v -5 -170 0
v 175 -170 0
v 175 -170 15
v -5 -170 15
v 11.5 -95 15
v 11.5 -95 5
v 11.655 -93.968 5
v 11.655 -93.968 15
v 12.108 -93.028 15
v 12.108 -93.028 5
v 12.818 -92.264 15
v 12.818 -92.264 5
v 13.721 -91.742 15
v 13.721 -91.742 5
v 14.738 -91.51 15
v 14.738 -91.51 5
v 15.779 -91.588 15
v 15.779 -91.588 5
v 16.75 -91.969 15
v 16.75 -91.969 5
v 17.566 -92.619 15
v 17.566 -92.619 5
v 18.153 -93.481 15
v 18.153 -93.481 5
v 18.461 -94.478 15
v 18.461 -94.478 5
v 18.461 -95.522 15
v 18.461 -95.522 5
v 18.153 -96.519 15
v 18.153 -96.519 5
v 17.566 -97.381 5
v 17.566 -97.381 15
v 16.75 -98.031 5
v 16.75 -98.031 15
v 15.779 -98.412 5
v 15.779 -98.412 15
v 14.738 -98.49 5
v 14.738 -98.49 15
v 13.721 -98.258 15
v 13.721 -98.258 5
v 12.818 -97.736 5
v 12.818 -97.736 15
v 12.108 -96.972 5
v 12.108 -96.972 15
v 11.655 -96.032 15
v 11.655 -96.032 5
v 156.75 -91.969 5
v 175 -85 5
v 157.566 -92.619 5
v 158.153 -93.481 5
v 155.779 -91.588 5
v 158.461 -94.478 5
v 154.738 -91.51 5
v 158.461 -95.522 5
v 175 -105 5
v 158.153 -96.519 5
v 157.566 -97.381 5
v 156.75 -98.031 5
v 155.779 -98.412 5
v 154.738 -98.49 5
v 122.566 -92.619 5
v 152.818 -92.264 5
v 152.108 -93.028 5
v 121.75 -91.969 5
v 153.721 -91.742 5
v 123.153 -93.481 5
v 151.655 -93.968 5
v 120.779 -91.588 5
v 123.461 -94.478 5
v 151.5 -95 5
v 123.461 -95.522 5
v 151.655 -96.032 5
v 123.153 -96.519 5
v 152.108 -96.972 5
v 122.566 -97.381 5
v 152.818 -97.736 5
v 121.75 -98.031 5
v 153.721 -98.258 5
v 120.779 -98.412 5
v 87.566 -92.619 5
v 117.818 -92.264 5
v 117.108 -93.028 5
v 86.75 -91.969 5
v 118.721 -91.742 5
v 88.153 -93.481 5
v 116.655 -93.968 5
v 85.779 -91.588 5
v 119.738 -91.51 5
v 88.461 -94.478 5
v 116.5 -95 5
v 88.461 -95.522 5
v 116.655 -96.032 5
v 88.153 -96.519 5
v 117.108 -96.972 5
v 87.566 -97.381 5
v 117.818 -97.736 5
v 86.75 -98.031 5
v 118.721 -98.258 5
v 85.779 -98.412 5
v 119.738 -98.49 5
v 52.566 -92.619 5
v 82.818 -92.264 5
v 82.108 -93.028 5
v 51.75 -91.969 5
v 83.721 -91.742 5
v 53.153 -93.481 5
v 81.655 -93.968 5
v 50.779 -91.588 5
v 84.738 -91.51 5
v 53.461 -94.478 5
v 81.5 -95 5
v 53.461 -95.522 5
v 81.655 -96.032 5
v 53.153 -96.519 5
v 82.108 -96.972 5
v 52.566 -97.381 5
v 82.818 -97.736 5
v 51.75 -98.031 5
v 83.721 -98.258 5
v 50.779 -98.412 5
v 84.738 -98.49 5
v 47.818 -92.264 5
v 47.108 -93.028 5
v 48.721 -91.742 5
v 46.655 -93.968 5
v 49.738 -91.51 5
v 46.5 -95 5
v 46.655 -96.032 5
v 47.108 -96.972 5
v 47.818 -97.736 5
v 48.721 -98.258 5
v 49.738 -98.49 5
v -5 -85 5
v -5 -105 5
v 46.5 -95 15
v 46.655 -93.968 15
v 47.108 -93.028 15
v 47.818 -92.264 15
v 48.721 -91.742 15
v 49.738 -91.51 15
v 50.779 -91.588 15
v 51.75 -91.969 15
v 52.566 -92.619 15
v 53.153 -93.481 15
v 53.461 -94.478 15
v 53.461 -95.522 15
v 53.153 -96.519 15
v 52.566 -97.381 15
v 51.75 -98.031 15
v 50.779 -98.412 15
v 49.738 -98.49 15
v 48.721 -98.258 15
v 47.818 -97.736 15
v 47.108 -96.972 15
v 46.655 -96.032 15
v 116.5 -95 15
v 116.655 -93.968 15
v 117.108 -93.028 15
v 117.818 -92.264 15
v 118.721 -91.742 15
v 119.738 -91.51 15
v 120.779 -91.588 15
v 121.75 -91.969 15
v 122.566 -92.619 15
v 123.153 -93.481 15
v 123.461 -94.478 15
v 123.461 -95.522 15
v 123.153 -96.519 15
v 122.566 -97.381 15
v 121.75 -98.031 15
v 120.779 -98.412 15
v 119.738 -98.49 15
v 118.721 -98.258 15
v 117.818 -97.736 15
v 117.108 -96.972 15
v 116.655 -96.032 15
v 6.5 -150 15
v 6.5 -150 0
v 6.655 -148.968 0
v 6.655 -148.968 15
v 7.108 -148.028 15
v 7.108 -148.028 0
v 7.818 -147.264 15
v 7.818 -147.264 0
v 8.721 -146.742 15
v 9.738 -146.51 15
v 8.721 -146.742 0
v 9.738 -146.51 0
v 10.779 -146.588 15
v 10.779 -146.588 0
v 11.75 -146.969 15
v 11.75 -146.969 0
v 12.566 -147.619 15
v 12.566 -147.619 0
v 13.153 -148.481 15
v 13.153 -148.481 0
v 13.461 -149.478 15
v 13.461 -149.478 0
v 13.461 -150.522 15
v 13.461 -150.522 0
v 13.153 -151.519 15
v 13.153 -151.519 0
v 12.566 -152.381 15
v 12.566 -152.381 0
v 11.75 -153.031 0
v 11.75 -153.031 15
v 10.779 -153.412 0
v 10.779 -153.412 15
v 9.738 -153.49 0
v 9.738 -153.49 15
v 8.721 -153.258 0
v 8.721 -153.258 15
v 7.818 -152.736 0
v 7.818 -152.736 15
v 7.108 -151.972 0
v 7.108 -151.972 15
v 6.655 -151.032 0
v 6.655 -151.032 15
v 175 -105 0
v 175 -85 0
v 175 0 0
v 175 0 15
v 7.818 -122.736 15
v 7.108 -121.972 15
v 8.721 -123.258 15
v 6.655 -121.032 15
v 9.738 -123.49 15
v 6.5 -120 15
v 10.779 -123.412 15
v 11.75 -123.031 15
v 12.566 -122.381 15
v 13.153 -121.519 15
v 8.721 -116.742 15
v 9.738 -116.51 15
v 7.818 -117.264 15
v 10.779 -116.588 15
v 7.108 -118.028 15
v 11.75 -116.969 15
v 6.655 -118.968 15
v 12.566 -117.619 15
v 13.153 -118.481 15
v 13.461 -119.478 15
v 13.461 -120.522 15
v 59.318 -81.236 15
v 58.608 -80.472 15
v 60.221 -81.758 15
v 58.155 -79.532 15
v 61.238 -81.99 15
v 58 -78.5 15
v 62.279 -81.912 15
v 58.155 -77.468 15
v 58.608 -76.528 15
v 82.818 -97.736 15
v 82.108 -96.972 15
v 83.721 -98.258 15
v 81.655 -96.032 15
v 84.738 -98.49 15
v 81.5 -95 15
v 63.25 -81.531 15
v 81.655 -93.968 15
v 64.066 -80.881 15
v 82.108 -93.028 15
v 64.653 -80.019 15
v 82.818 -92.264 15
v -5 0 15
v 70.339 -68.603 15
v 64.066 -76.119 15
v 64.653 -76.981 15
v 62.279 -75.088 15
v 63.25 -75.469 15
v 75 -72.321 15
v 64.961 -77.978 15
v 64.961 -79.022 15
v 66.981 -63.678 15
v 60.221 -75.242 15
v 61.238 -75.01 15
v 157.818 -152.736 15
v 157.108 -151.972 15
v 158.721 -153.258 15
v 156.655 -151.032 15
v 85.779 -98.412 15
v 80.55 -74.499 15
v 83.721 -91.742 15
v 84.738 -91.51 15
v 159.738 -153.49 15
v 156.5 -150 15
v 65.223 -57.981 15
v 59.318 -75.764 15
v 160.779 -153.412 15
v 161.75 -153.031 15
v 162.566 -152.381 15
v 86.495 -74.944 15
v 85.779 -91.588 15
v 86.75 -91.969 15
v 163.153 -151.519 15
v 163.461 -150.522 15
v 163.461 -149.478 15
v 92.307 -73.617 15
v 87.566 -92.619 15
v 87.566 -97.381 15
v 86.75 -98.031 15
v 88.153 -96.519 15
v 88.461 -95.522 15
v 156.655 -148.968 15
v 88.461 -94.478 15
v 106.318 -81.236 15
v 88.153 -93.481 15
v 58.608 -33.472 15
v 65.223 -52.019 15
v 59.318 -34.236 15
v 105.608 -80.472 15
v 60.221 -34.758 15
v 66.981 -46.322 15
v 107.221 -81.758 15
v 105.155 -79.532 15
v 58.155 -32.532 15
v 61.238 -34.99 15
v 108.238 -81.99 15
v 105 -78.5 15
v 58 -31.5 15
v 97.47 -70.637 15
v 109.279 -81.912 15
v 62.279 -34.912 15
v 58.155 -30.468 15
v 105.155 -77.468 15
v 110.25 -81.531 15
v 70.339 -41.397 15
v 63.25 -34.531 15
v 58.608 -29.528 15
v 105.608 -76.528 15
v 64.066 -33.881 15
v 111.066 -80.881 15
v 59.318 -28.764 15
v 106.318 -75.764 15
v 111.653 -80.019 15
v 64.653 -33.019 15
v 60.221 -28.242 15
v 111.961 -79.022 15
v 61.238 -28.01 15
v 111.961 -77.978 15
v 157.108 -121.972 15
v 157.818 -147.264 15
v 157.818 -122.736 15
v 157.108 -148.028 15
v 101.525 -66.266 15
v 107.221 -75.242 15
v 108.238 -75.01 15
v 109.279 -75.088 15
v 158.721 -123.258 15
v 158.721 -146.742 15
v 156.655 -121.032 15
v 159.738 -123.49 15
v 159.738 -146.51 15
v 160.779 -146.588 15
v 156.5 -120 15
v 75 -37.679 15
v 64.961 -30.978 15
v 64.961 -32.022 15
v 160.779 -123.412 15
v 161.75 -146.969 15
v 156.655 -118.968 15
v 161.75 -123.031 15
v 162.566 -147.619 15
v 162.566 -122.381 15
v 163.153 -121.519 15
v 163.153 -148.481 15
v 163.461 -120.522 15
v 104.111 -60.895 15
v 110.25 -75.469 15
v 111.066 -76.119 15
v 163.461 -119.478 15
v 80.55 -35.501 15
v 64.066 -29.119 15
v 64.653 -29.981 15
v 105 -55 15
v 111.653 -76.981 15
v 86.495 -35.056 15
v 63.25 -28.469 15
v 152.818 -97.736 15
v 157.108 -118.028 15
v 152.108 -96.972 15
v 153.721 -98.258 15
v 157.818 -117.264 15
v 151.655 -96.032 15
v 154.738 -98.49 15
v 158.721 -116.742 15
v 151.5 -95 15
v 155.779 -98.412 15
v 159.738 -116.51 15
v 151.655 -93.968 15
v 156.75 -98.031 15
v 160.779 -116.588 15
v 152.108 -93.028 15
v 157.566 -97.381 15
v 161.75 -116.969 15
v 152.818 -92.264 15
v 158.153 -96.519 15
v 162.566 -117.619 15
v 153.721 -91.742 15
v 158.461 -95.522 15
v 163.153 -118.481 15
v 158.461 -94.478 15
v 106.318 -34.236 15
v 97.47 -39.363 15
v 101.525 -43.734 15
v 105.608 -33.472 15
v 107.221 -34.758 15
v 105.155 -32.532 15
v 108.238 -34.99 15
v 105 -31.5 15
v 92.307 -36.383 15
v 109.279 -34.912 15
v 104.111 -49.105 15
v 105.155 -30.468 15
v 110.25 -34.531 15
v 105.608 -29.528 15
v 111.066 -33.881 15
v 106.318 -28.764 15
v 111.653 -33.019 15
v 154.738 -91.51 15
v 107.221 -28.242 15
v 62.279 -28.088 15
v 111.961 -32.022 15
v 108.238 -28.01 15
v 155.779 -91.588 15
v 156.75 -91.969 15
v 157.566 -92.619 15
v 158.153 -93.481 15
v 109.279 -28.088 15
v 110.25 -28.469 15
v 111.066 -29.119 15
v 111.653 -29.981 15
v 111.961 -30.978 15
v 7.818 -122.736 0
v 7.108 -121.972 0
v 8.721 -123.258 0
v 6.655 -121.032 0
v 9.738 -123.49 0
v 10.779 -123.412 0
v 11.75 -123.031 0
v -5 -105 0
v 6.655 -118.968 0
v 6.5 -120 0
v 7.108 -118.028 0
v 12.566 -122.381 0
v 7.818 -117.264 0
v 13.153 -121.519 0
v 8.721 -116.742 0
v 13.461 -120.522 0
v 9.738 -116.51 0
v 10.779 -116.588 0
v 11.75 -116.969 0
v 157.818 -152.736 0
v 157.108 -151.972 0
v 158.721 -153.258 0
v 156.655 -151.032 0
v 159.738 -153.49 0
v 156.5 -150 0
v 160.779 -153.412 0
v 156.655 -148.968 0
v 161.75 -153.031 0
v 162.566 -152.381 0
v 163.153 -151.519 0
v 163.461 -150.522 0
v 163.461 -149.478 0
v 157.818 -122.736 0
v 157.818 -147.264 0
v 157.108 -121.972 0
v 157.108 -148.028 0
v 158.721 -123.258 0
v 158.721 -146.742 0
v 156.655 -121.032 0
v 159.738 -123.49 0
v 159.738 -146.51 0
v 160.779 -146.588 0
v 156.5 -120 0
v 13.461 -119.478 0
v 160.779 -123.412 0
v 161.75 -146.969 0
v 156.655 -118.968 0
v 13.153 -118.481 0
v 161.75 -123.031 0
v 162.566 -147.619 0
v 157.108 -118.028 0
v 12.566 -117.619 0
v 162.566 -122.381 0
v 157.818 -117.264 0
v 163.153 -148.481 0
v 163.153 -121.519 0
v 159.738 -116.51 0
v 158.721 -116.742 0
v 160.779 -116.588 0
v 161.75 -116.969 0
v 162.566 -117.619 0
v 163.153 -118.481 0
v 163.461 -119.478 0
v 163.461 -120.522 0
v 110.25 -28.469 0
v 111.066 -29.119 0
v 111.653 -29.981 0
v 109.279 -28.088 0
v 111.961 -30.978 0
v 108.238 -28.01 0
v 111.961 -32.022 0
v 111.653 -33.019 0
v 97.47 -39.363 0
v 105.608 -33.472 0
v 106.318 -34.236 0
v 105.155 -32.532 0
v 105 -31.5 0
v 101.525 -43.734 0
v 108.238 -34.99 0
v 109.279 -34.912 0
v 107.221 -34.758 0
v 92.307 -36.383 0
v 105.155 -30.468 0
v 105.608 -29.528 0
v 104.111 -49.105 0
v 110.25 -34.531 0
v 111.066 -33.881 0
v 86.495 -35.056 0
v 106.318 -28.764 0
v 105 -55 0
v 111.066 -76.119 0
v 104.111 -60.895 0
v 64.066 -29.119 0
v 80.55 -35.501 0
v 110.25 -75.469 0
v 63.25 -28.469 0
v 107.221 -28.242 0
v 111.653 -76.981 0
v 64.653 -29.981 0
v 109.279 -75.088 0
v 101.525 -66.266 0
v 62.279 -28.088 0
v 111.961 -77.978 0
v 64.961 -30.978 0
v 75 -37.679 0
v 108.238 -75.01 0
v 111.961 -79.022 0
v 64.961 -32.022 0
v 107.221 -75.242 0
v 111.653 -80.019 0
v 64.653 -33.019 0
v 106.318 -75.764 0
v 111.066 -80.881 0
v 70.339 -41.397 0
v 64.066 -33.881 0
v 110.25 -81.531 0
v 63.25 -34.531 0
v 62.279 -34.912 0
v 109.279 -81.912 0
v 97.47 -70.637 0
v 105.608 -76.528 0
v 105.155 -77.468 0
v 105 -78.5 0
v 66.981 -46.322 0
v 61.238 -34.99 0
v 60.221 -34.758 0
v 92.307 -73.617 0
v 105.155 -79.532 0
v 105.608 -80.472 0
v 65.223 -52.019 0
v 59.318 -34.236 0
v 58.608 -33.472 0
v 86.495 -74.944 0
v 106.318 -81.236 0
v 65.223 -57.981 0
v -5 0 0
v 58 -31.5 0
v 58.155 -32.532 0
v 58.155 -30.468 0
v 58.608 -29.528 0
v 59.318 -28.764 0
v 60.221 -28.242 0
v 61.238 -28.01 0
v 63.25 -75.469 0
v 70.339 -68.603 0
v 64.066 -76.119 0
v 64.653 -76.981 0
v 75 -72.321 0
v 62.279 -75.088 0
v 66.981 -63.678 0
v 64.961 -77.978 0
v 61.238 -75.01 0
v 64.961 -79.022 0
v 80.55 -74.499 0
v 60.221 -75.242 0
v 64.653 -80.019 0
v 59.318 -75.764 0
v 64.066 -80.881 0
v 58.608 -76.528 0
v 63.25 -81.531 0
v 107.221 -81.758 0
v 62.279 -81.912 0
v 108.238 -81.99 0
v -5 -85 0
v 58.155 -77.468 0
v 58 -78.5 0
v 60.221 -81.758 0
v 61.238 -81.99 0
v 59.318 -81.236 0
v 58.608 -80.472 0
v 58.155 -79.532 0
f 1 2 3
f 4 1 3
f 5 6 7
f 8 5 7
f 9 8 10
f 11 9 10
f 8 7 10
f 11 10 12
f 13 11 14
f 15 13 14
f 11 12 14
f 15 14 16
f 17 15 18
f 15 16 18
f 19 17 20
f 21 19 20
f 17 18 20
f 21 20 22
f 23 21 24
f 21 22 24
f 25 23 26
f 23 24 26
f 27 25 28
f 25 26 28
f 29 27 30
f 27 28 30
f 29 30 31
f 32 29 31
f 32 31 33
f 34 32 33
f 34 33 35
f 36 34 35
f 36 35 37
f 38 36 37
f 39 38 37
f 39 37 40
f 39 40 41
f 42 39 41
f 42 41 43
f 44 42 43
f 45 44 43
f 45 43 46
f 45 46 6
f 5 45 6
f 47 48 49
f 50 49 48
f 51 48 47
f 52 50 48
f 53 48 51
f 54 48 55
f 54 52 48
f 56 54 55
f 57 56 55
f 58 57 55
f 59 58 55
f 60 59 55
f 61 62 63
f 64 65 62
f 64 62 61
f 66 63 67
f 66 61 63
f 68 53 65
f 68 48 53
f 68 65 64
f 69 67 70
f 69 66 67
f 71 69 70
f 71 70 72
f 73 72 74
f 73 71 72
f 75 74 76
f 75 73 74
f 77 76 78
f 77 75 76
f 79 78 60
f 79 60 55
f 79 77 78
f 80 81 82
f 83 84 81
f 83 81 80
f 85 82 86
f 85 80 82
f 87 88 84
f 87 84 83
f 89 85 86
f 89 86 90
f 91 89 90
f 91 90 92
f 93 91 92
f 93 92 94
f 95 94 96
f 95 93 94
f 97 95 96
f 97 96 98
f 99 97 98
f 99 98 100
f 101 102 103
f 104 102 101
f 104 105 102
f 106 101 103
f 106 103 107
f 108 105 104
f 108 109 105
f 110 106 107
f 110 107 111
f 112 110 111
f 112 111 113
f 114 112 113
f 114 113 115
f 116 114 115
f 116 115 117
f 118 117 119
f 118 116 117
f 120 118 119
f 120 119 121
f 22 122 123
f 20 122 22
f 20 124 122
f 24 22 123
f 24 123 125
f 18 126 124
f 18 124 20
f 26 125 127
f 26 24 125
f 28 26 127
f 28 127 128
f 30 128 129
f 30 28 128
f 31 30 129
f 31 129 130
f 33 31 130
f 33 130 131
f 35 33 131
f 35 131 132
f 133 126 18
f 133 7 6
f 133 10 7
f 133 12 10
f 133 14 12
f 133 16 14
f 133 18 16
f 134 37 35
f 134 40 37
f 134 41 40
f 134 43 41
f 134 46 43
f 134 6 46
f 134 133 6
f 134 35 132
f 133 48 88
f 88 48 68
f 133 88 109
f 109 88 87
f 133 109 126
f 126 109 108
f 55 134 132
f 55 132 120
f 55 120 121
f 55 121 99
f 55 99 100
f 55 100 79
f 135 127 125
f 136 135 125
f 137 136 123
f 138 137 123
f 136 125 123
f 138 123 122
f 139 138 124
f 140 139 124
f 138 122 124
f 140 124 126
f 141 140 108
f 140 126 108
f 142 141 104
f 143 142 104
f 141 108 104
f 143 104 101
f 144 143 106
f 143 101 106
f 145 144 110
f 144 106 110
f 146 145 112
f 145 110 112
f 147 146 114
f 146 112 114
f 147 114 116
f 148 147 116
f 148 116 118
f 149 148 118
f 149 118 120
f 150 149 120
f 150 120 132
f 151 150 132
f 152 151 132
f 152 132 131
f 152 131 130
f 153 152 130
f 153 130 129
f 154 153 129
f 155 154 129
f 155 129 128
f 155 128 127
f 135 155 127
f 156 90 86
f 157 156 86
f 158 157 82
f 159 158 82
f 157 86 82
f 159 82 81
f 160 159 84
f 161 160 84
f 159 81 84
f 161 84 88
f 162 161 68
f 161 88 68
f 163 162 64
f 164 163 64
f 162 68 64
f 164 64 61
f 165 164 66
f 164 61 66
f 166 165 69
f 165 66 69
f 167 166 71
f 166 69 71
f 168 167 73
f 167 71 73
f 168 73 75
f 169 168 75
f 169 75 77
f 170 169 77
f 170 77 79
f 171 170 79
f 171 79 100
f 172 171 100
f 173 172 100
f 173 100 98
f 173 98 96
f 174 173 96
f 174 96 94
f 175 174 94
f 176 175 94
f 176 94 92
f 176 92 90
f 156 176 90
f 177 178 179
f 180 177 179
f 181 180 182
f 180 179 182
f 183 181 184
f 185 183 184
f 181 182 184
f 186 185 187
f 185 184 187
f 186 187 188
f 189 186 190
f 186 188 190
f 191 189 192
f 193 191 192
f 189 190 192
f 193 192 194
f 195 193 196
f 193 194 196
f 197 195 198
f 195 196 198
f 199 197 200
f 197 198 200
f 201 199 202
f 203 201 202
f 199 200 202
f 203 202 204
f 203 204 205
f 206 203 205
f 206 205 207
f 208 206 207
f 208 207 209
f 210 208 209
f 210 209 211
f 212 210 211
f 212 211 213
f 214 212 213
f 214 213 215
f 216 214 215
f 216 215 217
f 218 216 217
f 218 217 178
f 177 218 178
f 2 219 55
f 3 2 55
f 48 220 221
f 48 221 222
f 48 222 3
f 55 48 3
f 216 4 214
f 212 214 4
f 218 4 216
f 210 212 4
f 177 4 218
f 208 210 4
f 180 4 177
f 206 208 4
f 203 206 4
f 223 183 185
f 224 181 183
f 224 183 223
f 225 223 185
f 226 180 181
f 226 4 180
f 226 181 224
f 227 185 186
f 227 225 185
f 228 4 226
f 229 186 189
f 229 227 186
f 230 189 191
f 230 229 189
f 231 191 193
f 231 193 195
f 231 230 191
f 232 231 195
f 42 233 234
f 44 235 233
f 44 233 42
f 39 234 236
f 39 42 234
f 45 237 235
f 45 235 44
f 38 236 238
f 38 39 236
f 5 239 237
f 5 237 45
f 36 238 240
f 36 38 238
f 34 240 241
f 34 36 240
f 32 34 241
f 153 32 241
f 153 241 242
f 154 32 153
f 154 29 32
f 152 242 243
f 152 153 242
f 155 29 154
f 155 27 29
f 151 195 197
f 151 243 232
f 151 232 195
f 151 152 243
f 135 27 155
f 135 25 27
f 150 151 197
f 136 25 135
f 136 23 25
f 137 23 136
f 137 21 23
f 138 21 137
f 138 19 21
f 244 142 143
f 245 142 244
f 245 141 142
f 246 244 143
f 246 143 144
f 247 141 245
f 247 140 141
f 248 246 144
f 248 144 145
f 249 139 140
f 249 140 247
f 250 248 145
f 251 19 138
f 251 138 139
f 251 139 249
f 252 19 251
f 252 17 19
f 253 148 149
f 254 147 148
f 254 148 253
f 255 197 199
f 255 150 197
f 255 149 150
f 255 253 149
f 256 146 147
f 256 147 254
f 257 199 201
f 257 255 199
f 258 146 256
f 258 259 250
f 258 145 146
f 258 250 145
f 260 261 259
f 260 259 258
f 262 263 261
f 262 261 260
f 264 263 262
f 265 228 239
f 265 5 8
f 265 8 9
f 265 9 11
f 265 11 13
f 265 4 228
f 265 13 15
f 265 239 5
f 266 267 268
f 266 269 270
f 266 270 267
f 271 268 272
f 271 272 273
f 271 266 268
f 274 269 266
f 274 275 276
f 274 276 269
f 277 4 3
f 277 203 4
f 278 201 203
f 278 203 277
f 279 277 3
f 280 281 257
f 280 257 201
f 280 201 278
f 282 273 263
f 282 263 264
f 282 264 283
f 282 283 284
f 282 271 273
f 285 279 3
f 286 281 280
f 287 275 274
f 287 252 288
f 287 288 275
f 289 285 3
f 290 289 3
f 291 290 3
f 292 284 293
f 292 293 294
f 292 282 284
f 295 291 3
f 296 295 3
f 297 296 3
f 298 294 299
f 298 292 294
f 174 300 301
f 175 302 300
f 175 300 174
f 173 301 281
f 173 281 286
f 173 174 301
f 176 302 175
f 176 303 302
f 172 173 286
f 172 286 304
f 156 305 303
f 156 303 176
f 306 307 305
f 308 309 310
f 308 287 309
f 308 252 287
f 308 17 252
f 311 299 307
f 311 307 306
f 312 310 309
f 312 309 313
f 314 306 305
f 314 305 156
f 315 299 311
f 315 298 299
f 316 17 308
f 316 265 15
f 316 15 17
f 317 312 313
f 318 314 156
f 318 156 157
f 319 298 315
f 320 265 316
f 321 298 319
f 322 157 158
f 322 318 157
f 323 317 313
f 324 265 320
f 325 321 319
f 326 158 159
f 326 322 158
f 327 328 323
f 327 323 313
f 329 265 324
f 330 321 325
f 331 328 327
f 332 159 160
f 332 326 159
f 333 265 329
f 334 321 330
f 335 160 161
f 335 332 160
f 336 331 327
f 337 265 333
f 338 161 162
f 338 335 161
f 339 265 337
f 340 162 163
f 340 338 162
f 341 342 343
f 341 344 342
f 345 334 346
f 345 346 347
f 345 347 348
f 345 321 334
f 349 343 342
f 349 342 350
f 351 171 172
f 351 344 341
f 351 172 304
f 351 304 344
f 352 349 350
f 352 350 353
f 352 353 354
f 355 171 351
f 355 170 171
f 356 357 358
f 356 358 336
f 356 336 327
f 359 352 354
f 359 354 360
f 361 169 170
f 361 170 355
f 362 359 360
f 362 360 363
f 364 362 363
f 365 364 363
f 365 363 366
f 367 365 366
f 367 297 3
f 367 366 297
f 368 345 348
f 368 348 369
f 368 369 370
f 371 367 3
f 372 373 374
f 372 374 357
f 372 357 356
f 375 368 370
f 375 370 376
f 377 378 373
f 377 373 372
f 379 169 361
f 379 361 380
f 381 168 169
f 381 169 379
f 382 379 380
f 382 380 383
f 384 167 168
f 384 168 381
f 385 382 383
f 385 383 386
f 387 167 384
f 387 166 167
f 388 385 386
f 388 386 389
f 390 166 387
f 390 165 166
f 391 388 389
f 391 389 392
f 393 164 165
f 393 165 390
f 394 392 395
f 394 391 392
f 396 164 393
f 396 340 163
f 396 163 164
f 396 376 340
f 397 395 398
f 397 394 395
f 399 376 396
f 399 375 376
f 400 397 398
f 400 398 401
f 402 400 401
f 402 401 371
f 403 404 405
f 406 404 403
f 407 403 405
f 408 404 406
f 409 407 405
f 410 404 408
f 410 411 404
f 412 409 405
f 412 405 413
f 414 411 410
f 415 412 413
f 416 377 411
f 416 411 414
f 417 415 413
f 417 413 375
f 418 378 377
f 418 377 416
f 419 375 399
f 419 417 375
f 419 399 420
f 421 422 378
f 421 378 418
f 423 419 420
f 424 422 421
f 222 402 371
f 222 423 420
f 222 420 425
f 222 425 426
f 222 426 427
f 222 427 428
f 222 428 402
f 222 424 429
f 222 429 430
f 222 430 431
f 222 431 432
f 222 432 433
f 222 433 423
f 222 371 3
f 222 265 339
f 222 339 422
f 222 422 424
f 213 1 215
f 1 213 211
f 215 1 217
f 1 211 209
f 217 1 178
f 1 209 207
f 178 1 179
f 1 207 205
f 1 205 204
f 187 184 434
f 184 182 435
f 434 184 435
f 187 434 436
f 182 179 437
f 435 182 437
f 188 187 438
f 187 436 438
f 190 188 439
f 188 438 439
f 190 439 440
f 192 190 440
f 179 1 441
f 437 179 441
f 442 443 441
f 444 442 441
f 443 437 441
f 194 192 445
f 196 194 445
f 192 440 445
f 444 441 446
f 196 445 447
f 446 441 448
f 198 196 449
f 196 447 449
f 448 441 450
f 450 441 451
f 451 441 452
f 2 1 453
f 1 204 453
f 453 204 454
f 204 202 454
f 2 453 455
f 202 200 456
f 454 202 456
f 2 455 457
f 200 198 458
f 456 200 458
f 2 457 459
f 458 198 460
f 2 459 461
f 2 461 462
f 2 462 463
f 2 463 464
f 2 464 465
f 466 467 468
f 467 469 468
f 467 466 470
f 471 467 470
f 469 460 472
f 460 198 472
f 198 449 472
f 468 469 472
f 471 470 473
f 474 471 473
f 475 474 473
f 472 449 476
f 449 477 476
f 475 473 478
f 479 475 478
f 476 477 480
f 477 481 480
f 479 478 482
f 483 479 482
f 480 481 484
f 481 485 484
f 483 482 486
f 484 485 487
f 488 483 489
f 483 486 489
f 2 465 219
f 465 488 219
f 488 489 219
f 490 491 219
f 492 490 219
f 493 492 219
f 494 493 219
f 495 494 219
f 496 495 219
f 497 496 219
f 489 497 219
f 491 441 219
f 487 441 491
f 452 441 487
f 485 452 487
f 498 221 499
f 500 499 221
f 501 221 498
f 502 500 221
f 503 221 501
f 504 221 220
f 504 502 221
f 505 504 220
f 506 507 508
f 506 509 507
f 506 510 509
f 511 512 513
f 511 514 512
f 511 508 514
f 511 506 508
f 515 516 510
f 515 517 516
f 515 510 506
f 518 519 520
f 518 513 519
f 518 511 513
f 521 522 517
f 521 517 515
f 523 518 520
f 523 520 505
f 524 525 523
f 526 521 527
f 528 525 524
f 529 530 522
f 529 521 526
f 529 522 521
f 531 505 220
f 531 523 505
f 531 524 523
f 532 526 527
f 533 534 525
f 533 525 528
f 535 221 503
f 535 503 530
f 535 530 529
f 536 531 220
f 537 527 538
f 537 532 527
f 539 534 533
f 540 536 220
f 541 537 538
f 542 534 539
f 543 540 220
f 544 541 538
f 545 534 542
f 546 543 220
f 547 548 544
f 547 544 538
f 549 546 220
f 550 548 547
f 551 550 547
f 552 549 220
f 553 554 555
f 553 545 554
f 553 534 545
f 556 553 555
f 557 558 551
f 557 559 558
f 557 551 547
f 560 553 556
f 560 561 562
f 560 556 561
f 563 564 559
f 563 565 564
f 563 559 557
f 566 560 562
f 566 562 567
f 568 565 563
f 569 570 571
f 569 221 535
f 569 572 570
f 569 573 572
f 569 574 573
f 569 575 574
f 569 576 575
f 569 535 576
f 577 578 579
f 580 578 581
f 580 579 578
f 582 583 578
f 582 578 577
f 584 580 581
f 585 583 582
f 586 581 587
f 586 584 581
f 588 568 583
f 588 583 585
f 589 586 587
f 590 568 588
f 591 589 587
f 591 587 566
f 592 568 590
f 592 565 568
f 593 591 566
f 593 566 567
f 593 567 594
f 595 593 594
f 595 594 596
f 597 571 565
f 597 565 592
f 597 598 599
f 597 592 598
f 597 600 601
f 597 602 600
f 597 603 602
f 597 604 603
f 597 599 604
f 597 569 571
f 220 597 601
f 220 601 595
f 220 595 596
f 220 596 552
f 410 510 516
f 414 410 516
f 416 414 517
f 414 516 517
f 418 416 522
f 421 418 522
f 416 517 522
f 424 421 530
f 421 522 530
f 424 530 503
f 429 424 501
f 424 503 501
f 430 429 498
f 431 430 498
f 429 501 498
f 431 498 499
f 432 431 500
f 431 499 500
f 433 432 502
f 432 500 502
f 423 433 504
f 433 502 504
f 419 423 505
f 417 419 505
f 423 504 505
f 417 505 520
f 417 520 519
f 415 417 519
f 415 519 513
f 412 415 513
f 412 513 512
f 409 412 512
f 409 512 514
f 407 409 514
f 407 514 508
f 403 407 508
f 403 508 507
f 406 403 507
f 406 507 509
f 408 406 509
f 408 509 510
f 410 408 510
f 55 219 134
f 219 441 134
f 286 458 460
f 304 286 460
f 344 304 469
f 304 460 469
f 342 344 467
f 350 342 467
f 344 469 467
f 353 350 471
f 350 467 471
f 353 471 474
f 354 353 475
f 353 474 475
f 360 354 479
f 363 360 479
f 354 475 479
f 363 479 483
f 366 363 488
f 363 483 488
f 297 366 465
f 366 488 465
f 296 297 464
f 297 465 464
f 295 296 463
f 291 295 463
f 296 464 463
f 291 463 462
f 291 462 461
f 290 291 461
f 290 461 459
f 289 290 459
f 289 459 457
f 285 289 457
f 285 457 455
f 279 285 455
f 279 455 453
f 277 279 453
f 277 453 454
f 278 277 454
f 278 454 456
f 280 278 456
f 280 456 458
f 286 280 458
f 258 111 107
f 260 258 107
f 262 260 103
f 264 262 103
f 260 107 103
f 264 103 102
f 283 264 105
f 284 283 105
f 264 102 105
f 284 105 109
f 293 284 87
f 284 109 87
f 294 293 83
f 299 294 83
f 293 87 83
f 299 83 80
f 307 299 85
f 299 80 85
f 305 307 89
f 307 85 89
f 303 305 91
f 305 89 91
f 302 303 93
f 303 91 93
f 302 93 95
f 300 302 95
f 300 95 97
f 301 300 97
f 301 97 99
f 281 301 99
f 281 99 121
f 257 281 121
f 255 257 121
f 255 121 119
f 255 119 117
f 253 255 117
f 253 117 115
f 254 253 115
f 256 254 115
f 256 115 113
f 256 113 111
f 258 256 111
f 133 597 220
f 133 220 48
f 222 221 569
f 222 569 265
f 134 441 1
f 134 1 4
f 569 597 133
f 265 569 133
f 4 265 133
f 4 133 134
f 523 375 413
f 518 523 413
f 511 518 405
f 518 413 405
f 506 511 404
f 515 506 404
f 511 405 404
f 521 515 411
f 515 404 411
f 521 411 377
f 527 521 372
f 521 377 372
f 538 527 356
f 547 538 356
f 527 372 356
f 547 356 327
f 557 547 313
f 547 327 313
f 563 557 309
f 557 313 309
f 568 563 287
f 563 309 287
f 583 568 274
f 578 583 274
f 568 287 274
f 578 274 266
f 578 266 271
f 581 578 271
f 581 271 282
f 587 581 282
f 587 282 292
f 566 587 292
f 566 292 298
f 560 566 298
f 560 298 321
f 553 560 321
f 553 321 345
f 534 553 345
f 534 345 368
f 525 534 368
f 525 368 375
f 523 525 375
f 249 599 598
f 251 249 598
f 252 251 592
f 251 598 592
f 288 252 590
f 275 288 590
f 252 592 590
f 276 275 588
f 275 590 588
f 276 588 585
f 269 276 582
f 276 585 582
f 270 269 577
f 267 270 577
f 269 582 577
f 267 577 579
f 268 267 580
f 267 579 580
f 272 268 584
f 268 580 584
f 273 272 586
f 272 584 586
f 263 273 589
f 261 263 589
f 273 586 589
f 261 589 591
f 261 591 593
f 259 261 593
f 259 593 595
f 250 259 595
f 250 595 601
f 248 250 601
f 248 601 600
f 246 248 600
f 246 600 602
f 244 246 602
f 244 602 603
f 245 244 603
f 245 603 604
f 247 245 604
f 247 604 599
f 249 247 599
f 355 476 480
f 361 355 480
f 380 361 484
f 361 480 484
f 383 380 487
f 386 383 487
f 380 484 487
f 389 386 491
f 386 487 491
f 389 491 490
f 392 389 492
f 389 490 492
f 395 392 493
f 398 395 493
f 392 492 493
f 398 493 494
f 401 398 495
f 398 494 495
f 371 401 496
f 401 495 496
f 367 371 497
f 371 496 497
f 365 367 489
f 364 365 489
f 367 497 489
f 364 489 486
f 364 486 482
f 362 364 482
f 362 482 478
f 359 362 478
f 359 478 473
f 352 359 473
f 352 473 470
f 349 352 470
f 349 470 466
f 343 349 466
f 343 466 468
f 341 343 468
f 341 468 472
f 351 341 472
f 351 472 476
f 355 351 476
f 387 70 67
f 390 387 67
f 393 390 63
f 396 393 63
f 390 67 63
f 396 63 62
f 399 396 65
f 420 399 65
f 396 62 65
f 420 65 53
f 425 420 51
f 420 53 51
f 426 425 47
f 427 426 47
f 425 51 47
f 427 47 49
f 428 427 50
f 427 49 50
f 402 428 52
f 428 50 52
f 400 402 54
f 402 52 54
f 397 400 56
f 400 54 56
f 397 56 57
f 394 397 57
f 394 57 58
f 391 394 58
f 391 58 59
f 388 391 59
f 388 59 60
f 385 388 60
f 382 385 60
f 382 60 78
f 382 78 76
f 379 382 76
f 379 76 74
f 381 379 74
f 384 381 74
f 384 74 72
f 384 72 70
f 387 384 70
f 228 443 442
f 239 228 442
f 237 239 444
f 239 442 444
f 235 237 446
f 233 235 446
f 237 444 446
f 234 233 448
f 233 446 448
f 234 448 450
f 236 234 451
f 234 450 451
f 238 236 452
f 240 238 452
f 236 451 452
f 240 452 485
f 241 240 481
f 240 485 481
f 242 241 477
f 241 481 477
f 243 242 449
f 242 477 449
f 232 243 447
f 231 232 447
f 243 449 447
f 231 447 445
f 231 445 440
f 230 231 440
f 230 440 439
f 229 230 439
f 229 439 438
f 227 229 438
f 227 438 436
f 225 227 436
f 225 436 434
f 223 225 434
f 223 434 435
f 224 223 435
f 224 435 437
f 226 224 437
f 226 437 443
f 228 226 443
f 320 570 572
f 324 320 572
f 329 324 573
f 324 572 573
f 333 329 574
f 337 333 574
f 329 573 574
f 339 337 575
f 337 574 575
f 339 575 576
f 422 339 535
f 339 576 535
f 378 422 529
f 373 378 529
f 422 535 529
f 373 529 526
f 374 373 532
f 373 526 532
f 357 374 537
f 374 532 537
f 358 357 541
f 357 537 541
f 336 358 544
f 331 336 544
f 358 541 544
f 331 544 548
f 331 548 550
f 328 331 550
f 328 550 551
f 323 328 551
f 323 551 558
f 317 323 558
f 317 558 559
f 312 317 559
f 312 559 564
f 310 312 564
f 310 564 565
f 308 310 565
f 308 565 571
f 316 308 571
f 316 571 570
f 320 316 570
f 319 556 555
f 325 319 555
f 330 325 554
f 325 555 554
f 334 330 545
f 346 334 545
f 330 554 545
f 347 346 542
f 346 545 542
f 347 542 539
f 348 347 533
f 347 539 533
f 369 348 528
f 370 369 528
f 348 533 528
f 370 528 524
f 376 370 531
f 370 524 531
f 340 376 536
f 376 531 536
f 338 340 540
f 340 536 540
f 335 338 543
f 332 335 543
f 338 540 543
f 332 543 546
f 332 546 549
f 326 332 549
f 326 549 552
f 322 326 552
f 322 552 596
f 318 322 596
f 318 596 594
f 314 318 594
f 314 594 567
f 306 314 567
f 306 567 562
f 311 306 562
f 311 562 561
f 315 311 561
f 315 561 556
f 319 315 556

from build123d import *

# Parameters (mm, degrees)
F0_W      = 170
F0_H      = 15
F1_DEPTH  = 150
F2_W      = 170
F2_H      = 20
F3_DEPTH  = 5
F4_R      = 20
F5_DEPTH  = 25
F7_D      = 7
F8_DEPTH  = 5
F9_DEPTH  = 5
F11_D     = 7
F13_D     = 7
F14_DEPTH = 20
F16_D     = 7


# Not quite as in the source:
# - a feature names something its author has since deleted; it is built from what else it names


with BuildPart() as f1:
    # F0 (on Front) → F1 (new body)
    with BuildSketch(Plane.XZ):
        with Locations((85, 7.5)):
            Rectangle(F0_W, F0_H)
    extrude(amount=F1_DEPTH)

    # F2 (on face) → F3 (cut)
    with BuildSketch(Plane(origin=(0, 0, 0), x_dir=(1, 0, 0), z_dir=(0, 0, -1))):
        with Locations((85, 95)):
            Rectangle(F2_W, F2_H)
    extrude(amount=-F3_DEPTH, mode=Mode.SUBTRACT)

    # F4 (on face) → F5 (cut)
    with BuildSketch(Plane.XY.offset(15)):
        with Locations((85, -55)):
            Circle(F4_R)
    extrude(amount=-F5_DEPTH, mode=Mode.SUBTRACT)

    # F7 (through all)
    with Locations(Plane.XY.offset(15)):
        with Locations((61.5, -31.5), (61.5, -78.5), (108.5, -78.5), (108.5, -31.5)):
            Hole(F7_D / 2)

    # F8 (add): a face of the model
    f8_faces = [f1.faces().sort_by_distance(p)[0] for p in [
        (0, -74.0697674419, 7.7325581395),
    ]]
    extrude(f8_faces, amount=F8_DEPTH)

    # F9 (add): a face of the model
    f9_faces = [f1.faces().sort_by_distance(p)[0] for p in [
        (170, -74.0697674419, 7.7325581395),
    ]]
    extrude(f9_faces, amount=F9_DEPTH)

    # F11 (through all)
    with Locations(Plane.XY.offset(15)):
        with Locations((50, -95), (15, -95), (85, -95), (120, -95), (155, -95)):
            Hole(F11_D / 2)

    # F13 (through all)
    with Locations(Plane.XY.offset(15)):
        with Locations((10, -120), (160, -120)):
            Hole(F13_D / 2)

    # F14 (add): a face of the model
    f14_faces = [f1.faces().sort_by_distance(p)[0] for p in [
        (85, -150, 7.5),
    ]]
    extrude(f14_faces, amount=F14_DEPTH)

    # F16 (through all)
    with Locations(Plane.XY.offset(15)):
        with Locations((10, -150), (160, -150)):
            Hole(F16_D / 2)


solid = f1.part
